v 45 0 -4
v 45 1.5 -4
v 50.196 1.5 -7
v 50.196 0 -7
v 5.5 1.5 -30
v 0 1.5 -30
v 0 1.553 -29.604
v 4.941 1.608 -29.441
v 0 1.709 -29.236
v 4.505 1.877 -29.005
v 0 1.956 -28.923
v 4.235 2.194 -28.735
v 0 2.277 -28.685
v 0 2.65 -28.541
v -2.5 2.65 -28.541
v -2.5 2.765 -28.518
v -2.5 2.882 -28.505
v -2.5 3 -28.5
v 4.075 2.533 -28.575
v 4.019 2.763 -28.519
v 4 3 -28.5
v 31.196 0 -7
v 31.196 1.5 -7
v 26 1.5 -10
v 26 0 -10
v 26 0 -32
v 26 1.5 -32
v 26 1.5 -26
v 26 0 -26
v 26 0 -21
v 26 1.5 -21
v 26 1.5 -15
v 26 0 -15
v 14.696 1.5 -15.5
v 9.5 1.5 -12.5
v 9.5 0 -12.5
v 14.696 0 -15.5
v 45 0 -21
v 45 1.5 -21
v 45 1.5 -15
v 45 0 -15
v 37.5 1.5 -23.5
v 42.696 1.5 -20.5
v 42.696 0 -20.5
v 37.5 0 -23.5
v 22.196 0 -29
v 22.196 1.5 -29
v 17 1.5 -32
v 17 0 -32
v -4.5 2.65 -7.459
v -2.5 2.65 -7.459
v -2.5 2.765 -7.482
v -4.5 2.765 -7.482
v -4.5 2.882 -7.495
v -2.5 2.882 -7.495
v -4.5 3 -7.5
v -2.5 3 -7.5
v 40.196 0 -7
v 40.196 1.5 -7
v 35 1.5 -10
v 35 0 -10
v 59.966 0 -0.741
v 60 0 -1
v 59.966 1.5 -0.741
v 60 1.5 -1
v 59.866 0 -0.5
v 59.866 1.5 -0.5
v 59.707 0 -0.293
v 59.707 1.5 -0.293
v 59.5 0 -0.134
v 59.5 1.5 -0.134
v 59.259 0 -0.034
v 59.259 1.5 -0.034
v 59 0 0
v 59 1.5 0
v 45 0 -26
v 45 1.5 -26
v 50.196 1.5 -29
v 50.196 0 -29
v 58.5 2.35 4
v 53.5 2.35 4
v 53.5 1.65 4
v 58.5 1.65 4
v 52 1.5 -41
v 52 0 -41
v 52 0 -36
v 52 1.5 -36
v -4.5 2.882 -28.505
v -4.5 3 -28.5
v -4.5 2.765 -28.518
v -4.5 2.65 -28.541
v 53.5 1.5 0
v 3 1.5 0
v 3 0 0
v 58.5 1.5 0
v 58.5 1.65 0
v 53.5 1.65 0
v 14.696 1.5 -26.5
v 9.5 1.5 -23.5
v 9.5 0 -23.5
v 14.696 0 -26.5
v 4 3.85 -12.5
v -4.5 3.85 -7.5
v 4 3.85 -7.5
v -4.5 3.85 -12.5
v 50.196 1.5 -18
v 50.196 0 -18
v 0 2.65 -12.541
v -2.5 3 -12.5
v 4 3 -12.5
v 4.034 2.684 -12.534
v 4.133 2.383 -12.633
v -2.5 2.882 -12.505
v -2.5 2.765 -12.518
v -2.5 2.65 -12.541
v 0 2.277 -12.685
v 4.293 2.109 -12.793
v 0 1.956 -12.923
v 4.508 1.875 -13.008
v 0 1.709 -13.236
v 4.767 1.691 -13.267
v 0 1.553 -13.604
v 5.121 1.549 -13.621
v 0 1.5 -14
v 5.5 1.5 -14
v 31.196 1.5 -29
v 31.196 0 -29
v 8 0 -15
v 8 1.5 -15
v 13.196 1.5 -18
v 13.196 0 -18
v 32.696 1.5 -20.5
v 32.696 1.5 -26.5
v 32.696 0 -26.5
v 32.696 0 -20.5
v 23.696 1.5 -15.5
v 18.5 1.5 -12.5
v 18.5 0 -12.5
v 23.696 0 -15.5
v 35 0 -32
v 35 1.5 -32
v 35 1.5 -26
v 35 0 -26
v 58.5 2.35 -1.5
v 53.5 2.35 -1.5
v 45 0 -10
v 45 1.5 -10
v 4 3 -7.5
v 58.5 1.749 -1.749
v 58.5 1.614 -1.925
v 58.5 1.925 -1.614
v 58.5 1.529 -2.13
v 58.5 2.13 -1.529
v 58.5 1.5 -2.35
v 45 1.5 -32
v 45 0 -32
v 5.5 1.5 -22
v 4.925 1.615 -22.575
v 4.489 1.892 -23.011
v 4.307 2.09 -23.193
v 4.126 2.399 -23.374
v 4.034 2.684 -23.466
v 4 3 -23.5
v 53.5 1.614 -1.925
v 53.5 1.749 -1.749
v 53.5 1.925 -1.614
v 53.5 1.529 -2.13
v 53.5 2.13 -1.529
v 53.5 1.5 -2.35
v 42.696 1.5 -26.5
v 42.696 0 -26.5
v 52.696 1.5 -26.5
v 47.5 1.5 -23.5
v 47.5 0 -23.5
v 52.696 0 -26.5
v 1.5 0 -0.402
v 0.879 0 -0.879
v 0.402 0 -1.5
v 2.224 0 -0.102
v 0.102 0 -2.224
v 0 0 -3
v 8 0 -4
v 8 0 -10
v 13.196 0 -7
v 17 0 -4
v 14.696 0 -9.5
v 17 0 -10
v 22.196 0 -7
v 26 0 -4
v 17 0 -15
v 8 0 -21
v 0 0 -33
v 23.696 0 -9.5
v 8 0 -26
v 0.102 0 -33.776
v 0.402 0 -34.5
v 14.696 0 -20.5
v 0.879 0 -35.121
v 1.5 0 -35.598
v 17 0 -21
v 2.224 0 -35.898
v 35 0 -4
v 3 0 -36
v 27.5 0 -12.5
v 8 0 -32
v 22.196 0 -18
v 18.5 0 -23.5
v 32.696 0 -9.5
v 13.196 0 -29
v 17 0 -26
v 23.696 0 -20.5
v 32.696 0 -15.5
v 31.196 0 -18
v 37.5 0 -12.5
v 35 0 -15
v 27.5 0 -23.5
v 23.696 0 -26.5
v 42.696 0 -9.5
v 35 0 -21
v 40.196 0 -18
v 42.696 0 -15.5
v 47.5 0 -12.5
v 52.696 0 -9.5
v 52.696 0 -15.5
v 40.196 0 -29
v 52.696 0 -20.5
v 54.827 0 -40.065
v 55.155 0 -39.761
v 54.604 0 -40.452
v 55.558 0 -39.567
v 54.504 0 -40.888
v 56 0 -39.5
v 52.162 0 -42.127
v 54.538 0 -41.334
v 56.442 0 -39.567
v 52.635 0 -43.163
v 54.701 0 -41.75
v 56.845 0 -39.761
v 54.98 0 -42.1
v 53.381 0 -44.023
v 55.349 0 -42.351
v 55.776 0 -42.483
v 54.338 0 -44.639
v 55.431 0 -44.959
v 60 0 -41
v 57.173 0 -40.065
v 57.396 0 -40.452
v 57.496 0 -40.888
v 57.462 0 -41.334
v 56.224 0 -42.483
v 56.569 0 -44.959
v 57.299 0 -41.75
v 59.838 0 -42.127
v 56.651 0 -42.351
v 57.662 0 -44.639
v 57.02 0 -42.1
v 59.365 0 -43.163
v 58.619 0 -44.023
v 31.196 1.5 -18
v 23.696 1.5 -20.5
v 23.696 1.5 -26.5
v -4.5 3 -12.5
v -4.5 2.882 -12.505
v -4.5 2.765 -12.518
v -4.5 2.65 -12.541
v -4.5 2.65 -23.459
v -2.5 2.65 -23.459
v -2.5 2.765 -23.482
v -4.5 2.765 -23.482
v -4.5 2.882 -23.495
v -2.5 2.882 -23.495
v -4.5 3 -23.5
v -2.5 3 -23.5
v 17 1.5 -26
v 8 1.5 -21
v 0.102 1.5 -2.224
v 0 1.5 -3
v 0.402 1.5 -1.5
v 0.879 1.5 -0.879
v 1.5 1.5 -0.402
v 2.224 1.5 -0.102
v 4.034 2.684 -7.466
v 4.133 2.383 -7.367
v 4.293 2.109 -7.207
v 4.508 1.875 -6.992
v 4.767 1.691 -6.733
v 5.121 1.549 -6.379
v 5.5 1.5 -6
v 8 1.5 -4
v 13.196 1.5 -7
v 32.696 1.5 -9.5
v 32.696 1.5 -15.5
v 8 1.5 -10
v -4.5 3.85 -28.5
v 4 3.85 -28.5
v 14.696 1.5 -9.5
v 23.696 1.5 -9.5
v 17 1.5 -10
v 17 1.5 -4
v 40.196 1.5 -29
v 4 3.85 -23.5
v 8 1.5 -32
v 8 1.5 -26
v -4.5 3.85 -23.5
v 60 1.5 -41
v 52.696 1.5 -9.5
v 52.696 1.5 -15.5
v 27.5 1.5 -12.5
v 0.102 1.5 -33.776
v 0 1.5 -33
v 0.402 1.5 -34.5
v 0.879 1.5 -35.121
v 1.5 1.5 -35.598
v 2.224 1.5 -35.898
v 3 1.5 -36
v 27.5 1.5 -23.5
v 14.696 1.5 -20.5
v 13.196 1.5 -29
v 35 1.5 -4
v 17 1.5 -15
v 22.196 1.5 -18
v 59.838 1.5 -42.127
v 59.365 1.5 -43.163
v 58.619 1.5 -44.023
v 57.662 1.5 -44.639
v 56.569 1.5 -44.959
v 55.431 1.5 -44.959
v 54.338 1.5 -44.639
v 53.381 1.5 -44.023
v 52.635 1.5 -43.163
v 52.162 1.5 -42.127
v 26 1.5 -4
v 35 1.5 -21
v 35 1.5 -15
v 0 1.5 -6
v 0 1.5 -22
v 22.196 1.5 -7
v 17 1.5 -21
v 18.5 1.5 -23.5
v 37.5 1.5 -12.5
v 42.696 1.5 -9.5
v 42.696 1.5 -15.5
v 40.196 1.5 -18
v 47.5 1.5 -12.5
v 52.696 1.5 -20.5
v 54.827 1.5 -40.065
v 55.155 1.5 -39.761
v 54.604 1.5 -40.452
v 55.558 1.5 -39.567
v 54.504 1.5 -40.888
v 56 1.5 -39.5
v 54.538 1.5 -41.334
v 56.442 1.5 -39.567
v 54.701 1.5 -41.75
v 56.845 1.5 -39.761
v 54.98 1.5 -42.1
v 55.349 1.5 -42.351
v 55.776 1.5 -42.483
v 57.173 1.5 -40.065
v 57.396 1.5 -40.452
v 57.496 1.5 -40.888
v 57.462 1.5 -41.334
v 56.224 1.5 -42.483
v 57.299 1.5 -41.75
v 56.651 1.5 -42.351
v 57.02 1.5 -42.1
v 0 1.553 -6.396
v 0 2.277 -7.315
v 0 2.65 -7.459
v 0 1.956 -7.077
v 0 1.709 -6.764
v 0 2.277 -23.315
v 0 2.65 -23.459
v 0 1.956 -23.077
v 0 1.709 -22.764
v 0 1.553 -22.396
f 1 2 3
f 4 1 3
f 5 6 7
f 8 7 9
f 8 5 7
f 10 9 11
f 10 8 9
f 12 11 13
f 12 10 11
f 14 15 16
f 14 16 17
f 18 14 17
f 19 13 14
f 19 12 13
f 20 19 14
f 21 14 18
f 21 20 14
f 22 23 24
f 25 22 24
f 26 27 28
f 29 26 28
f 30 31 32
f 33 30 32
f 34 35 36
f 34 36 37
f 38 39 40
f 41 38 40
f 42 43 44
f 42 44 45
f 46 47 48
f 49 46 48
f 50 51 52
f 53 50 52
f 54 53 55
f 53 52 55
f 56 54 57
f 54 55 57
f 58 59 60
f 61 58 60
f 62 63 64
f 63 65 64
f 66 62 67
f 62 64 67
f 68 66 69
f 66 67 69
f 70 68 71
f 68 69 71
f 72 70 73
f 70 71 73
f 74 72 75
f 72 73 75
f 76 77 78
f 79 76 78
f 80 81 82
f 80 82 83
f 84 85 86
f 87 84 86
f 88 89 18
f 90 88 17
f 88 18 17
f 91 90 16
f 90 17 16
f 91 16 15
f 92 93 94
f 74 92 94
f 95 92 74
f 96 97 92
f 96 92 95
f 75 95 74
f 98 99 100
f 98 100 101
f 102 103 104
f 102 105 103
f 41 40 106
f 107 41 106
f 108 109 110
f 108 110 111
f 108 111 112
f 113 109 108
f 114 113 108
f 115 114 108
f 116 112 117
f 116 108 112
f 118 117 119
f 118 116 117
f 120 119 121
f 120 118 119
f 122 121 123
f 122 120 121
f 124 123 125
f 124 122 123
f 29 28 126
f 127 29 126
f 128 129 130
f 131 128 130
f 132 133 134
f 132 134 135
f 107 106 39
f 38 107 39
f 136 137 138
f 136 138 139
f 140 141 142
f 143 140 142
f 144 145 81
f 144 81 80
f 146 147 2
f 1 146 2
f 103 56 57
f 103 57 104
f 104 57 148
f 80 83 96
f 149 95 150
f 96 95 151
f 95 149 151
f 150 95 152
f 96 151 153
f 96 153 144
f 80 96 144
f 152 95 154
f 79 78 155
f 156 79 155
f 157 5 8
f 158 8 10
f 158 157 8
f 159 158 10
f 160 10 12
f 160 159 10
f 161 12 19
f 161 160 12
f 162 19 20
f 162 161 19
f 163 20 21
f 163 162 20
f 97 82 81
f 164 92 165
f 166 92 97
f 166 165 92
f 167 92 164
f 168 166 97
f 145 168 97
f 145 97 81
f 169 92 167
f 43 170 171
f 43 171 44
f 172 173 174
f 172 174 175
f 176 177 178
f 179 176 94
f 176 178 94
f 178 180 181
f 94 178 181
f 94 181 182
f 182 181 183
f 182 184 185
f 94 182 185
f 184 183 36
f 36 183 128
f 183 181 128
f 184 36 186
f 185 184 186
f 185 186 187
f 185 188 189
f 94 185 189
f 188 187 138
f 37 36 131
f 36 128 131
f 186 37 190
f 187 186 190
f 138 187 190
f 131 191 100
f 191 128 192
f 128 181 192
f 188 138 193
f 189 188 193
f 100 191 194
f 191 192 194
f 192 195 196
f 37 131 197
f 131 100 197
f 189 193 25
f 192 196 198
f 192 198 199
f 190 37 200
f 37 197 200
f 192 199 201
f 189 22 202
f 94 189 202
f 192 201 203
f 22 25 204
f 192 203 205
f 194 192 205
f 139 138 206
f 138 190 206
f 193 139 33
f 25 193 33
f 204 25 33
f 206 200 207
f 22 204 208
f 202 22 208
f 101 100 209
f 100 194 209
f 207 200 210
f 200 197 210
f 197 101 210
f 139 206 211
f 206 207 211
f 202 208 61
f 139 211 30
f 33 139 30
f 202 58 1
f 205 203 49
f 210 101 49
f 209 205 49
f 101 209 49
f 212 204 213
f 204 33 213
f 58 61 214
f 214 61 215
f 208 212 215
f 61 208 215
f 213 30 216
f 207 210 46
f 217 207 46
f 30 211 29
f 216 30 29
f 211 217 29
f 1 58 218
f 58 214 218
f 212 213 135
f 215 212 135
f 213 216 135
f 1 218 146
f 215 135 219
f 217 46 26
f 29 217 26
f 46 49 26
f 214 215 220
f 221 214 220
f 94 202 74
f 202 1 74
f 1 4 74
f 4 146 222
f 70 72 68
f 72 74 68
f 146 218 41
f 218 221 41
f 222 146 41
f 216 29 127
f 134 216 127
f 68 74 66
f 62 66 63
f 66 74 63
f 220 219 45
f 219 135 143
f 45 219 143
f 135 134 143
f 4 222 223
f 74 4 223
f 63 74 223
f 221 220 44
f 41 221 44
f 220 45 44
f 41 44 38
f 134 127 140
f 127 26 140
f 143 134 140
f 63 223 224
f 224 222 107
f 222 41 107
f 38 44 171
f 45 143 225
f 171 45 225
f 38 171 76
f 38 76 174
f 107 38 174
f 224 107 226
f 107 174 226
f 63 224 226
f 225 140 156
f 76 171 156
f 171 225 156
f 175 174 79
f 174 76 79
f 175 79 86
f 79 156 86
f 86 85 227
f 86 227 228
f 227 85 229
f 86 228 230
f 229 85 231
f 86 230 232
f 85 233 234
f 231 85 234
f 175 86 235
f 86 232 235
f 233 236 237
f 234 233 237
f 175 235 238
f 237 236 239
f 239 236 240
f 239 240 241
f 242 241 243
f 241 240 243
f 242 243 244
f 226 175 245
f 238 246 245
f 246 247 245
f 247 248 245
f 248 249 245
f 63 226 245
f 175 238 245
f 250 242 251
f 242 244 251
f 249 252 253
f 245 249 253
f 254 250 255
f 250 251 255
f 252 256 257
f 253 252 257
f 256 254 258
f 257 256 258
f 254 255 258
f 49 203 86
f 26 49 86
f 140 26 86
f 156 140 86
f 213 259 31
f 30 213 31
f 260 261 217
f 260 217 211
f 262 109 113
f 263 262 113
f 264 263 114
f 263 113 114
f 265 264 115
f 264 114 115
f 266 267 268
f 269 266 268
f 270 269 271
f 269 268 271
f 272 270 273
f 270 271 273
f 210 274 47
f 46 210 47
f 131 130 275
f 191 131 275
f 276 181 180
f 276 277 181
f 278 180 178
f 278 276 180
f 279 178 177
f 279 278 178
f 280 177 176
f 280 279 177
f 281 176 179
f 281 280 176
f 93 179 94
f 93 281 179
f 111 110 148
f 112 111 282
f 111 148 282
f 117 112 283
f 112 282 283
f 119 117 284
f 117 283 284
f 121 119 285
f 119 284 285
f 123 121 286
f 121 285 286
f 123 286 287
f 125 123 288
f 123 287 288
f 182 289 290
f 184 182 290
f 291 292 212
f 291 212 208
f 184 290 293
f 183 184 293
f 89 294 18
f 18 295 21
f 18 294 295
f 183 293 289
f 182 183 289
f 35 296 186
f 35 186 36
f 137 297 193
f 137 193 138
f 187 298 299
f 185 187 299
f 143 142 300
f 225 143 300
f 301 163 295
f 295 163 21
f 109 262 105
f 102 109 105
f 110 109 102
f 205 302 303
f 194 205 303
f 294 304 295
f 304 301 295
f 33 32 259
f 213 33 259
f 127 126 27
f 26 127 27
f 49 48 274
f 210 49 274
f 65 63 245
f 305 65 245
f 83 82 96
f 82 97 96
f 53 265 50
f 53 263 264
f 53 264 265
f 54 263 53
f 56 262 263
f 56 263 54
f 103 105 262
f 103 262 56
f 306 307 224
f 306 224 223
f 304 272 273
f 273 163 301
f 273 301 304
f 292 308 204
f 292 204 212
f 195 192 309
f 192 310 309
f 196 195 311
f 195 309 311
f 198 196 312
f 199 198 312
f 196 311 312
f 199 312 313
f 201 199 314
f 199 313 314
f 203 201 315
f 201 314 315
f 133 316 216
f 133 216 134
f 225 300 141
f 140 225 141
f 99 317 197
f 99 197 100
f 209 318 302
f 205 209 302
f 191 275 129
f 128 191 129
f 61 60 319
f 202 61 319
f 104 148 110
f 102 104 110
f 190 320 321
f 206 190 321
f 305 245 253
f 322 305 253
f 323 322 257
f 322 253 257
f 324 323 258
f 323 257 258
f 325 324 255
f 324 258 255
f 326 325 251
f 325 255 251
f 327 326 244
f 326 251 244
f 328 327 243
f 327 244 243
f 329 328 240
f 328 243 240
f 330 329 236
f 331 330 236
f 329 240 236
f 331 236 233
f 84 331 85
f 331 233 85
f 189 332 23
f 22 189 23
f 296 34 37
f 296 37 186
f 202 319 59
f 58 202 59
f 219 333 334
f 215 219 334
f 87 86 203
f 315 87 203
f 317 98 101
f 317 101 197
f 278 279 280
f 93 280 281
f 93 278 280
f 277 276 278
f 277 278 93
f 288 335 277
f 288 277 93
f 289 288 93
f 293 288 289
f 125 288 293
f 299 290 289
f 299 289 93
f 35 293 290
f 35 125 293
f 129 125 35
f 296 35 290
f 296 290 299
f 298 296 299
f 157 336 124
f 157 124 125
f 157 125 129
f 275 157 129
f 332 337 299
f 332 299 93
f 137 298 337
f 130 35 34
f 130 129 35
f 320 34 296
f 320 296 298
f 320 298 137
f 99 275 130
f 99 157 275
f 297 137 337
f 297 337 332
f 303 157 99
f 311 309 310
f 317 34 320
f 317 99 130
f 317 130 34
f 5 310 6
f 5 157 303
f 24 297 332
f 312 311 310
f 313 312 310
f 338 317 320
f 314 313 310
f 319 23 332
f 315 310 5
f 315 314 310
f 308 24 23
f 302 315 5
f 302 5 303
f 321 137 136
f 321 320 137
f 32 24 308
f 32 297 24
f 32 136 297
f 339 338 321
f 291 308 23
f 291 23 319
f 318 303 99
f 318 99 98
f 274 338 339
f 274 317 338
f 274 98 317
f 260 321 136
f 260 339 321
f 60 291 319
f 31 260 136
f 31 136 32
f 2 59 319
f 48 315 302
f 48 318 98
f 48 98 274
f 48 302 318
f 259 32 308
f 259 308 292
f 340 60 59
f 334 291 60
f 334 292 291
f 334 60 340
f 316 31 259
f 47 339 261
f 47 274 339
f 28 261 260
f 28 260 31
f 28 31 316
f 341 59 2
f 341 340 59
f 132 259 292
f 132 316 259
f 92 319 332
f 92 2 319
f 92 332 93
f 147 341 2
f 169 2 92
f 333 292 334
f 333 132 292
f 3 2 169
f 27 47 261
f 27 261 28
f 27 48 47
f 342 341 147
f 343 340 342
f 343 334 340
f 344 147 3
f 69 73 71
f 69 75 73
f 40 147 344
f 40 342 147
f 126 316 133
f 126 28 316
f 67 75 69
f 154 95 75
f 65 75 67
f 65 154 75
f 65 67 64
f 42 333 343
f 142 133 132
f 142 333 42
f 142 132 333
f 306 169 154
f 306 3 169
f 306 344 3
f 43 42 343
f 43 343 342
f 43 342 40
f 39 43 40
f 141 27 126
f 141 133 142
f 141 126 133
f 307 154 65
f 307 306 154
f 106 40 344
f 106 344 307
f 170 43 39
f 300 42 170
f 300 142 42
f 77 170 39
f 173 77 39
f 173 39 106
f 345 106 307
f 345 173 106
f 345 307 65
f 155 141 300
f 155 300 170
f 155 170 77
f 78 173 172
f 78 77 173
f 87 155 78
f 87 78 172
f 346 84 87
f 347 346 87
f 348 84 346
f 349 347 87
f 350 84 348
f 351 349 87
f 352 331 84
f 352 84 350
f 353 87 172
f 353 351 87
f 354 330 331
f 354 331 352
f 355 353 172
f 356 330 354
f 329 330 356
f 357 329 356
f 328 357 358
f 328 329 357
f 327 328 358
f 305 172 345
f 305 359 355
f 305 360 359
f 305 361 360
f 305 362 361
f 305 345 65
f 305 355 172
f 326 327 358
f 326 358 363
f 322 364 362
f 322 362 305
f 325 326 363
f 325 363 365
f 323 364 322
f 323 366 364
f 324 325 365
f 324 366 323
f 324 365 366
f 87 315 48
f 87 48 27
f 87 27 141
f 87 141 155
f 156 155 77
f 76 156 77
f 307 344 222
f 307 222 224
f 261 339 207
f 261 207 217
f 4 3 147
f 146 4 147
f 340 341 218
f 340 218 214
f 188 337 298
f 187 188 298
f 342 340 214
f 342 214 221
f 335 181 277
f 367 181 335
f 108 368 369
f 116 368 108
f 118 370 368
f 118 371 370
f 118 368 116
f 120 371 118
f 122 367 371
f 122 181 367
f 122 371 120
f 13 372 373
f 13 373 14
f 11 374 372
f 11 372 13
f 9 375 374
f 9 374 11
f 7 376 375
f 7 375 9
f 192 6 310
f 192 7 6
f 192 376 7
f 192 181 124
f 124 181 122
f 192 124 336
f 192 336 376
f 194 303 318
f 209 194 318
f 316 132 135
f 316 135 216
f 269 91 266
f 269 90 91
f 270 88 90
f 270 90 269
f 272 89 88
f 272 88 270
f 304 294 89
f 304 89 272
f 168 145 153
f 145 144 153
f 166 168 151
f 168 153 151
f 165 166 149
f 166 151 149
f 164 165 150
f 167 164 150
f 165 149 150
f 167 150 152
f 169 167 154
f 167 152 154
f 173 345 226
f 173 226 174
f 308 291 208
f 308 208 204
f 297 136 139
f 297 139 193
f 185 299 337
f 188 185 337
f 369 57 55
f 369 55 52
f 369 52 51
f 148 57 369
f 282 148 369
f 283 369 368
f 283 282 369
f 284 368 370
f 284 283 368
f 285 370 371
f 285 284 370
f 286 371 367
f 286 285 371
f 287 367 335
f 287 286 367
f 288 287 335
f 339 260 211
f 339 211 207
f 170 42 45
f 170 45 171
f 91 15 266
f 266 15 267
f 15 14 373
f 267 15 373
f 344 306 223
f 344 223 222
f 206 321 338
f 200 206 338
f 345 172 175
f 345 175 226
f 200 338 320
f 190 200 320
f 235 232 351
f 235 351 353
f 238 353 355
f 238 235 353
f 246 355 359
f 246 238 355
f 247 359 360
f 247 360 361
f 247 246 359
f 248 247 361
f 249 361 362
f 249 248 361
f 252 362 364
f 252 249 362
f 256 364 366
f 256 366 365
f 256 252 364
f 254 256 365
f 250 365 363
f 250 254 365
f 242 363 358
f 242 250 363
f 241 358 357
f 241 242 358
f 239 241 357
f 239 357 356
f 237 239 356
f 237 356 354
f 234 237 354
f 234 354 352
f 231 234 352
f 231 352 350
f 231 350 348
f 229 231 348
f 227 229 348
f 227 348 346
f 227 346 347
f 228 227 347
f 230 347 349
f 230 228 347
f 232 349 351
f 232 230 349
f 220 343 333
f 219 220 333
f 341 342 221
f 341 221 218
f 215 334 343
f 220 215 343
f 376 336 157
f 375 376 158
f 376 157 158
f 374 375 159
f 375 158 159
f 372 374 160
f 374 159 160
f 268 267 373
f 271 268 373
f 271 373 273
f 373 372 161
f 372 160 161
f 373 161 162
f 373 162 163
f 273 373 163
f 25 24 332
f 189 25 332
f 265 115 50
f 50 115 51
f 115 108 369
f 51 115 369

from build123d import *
from OCP.BRepFilletAPI import BRepFilletAPI_MakeFillet

# Parameters (mm, degrees)
SKETCH1_R                = 1.5
BOSS_EXTRUDE1_DEPTH      = 1.5
BOSS_EXTRUDE2_DEPTH      = 2
BOSS_EXTRUDE2_DEPTH_BACK = 1.5
SKETCH3_W                = 5
SKETCH3_H                = 0.7
SKETCH4_W                = 5
SKETCH4_H                = 1.5
BOSS_EXTRUDE3_DEPTH      = 0.15
FILLET2_R                = 0.85
SKETCH5_W                = 5
SKETCH5_H                = 1.2
BOSS_EXTRUDE4_DEPTH      = 2.5
BOSS_EXTRUDE4_2_DEPTH    = 2.5
SKETCH6_W                = 4
SKETCH6_H                = 5
BOSS_EXTRUDE5_DEPTH      = 2.35
FILLET3_R                = 1.5
CUT_EXTRUDE1_DEPTH       = 2.5
FILLET4_R1               = 3
FILLET4_R2               = 1
SKETCH8_W                = 5
SKETCH8_H                = 0.7
BOSS_EXTRUDE6_DEPTH      = 2
BOSS_EXTRUDE7_DEPTH      = 2


with BuildPart() as part:
    # Sketch1 → Boss-Extrude1 (new body)
    with BuildSketch(Plane(origin=(0, 0, 0), x_dir=(1, 0, 0), z_dir=(0, 1, 0))):
        with BuildLine():
            Line((0, 0), (60, 0))
            Line((60, 0), (60, 36))
            Line((60, 36), (60, 41))
            ThreePointArc((60, 41), (56, 45), (52, 41))
            Line((52, 41), (52, 36))
            Line((52, 36), (0, 36))
            Line((0, 36), (0, 0))
        make_face()
        with Locations(Location((56, 41, 0), (0, 0, 270))):
            Circle(SKETCH1_R, mode=Mode.SUBTRACT)
    extrude(amount=BOSS_EXTRUDE1_DEPTH)



with BuildPart() as body_2:
    # Sketch3 → Boss-Extrude2 (new, two sides: drawn at the far end of the back side and taken through both)
    with BuildSketch(Plane.XY.offset(-BOSS_EXTRUDE2_DEPTH_BACK)):
        with Locations((56, 2)):
            Rectangle(SKETCH3_W, SKETCH3_H)
    extrude(amount=BOSS_EXTRUDE2_DEPTH + BOSS_EXTRUDE2_DEPTH_BACK)


with BuildPart() as part_1:
    add(part.part)

    add(body_2.part)  # Boss-Extrude3 merges body 2
    # Sketch4 → Boss-Extrude3 (add)
    with BuildSketch(Plane.XZ.offset(-1.65)):
        with Locations((56, -0.75)):
            Rectangle(SKETCH4_W, SKETCH4_H)
    extrude(amount=BOSS_EXTRUDE3_DEPTH)

    # Fillet2
    fillet2_edges = [part_1.edges().sort_by_distance(p)[0] for p in [
        (56, 1.5, -1.5),
    ]]
    fillet(fillet2_edges, radius=FILLET2_R - 0.0001)  # a hair under: the kernel refuses the full size



with BuildPart() as body_2_2:
    # Sketch5 → Boss-Extrude4 (new body)
    with BuildSketch(Plane.ZY):
        with Locations((-10, 3.25)):
            Rectangle(SKETCH5_W, SKETCH5_H)
    extrude(amount=BOSS_EXTRUDE4_DEPTH)


with BuildPart() as body_3:
    # Sketch5 → Boss-Extrude4 2 (new body)
    with BuildSketch(Plane.ZY):
        with Locations((-26, 3.25)):
            Rectangle(SKETCH5_W, SKETCH5_H)
    extrude(amount=BOSS_EXTRUDE4_2_DEPTH)


with BuildPart() as part_2:
    add(part_1.part)

    add(body_2_2.part)  # Boss-Extrude5 merges body 2 2

    add(body_3.part)  # Boss-Extrude5 merges body 3
    # Sketch6 → Boss-Extrude5 (add)
    with BuildSketch(Plane(origin=(0, 1.5, 0), x_dir=(1, 0, 0), z_dir=(0, 1, 0))):
        with Locations((2, 26)):
            Rectangle(SKETCH6_W, SKETCH6_H)
        with Locations((2, 10)):
            Rectangle(SKETCH6_W, SKETCH6_H)
    extrude(amount=BOSS_EXTRUDE5_DEPTH)

    # Fillet3
    fillet3_edges = [part_2.edges().sort_by_distance(p)[0] for p in [
        (2, 1.5, -7.5),
    ]]
    fillet(fillet3_edges, radius=FILLET3_R)
    fillet3_2_edges = [part_2.edges().sort_by_distance(p)[0] for p in [
        (4, 1.5, -10),
    ]]
    fillet(fillet3_2_edges, radius=FILLET3_R)
    fillet3_3_edges = [part_2.edges().sort_by_distance(p)[0] for p in [
        (2, 1.5, -12.5),
    ]]
    fillet(fillet3_3_edges, radius=FILLET3_R)
    fillet3_4_edges = [part_2.edges().sort_by_distance(p)[0] for p in [
        (2, 1.5, -23.5),
    ]]
    fillet(fillet3_4_edges, radius=FILLET3_R)
    fillet3_5_edges = [part_2.edges().sort_by_distance(p)[0] for p in [
        (4, 1.5, -26),
    ]]
    fillet(fillet3_5_edges, radius=FILLET3_R - 0.0001)  # a hair under: the kernel refuses the full size
    fillet3_6_edges = [part_2.edges().sort_by_distance(p)[0] for p in [
        (2, 1.5, -28.5),
    ]]
    fillet(fillet3_6_edges, radius=FILLET3_R - 0.0001)  # a hair under: the kernel refuses the full size

    # Sketch7 → Cut-Extrude1 (cut)
    with BuildSketch(Plane(origin=(0, 1.5, 0), x_dir=(1, 0, 0), z_dir=(0, 1, 0))):
        Polygon((13.196152423, 29), (8, 32), (8, 26), align=None)
        Polygon((17, 26), (22.196152423, 29), (17, 32), align=None)
        Polygon((26, 26), (31.196152423, 29), (26, 32), align=None)
        Polygon((35, 26), (40.196152423, 29), (35, 32), align=None)
        Polygon((13.196152423, 18), (8, 21), (8, 15), align=None)
        Polygon((17, 15), (22.196152423, 18), (17, 21), align=None)
        Polygon((26, 15), (31.196152423, 18), (26, 21), align=None)
        Polygon((35, 15), (40.196152423, 18), (35, 21), align=None)
        Polygon((13.196152423, 7), (8, 10), (8, 4), align=None)
        Polygon((17, 4), (22.196152423, 7), (17, 10), align=None)
        Polygon((26, 4), (31.196152423, 7), (26, 10), align=None)
        Polygon((35, 4), (40.196152423, 7), (35, 10), align=None)
        Polygon((9.5, 23.5), (14.696152423, 26.5), (14.696152423, 20.5), align=None)
        Polygon((23.696152423, 20.5), (18.5, 23.5), (23.696152423, 26.5), align=None)
        Polygon((32.696152423, 20.5), (27.5, 23.5), (32.696152423, 26.5), align=None)
        Polygon((14.696152423, 9.5), (9.5, 12.5), (14.696152423, 15.5), align=None)
        Polygon((18.5, 12.5), (23.696152423, 15.5), (23.696152423, 9.5), align=None)
        Polygon((32.696152423, 9.5), (27.5, 12.5), (32.696152423, 15.5), align=None)
        Polygon((45, 26), (50.196152423, 29), (45, 32), align=None)
        Polygon((45, 15), (50.196152423, 18), (45, 21), align=None)
        Polygon((45, 4), (50.196152423, 7), (45, 10), align=None)
        Polygon((42.696152423, 20.5), (37.5, 23.5), (42.696152423, 26.5), align=None)
        Polygon((42.696152423, 9.5), (37.5, 12.5), (42.696152423, 15.5), align=None)
        Polygon((52.696152423, 20.5), (47.5, 23.5), (52.696152423, 26.5), align=None)
        Polygon((52.696152423, 9.5), (47.5, 12.5), (52.696152423, 15.5), align=None)
    extrude(amount=-CUT_EXTRUDE1_DEPTH, mode=Mode.SUBTRACT)

    # Fillet4: one fillet with a radius per group of edges: ONE call of the kernel's fillet builder (fillet() takes one radius for all edges)
    fillet4_edges_1 = [part_2.edges().sort_by_distance(p)[0] for p in [
        (0, 0.75, 0),
        (0, 0.75, -36),
    ]]
    fillet4_edges_2 = [part_2.edges().sort_by_distance(p)[0] for p in [
        (60, 0.75, 0),
    ]]
    fillet4 = BRepFilletAPI_MakeFillet(part_2.part.solid().wrapped)
    for e in fillet4_edges_1:
        fillet4.Add(FILLET4_R1, e.wrapped)
    for e in fillet4_edges_2:
        fillet4.Add(FILLET4_R2, e.wrapped)
    add(Compound.cast(fillet4.Shape()), mode=Mode.REPLACE)

    # Sketch8 → Boss-Extrude6 (add)
    with BuildSketch(Plane.XY.offset(2)):
        with Locations((56, 2)):
            Rectangle(SKETCH8_W, SKETCH8_H)
    extrude(amount=BOSS_EXTRUDE6_DEPTH)

    # Sketch9 → Boss-Extrude7 (add)
    with BuildSketch(Plane.ZY.offset(2.5)):
        with BuildLine():
            Line((-28.541404785, 2.65), (-23.458595215, 2.65))
            ThreePointArc((-23.458595215, 2.65), (-23.489612839, 2.823779714), (-23.5, 3))
            Line((-23.5, 3), (-23.5, 3.85))
            Line((-23.5, 3.85), (-28.5, 3.85))
            Line((-28.5, 3.85), (-28.5, 3))
            ThreePointArc((-28.5, 3), (-28.510387161, 2.823779714), (-28.541404785, 2.65))
        make_face()
        with BuildLine():
            Line((-12.541404785, 2.65), (-7.458595215, 2.65))
            ThreePointArc((-7.458595215, 2.65), (-7.489612839, 2.823779714), (-7.5, 3))
            Line((-7.5, 3), (-7.5, 3.85))
            Line((-7.5, 3.85), (-12.5, 3.85))
            Line((-12.5, 3.85), (-12.5, 3))
            ThreePointArc((-12.5, 3), (-12.510387161, 2.823779714), (-12.541404785, 2.65))
        make_face()
    extrude(amount=BOSS_EXTRUDE7_DEPTH)


solid = part_2.part
